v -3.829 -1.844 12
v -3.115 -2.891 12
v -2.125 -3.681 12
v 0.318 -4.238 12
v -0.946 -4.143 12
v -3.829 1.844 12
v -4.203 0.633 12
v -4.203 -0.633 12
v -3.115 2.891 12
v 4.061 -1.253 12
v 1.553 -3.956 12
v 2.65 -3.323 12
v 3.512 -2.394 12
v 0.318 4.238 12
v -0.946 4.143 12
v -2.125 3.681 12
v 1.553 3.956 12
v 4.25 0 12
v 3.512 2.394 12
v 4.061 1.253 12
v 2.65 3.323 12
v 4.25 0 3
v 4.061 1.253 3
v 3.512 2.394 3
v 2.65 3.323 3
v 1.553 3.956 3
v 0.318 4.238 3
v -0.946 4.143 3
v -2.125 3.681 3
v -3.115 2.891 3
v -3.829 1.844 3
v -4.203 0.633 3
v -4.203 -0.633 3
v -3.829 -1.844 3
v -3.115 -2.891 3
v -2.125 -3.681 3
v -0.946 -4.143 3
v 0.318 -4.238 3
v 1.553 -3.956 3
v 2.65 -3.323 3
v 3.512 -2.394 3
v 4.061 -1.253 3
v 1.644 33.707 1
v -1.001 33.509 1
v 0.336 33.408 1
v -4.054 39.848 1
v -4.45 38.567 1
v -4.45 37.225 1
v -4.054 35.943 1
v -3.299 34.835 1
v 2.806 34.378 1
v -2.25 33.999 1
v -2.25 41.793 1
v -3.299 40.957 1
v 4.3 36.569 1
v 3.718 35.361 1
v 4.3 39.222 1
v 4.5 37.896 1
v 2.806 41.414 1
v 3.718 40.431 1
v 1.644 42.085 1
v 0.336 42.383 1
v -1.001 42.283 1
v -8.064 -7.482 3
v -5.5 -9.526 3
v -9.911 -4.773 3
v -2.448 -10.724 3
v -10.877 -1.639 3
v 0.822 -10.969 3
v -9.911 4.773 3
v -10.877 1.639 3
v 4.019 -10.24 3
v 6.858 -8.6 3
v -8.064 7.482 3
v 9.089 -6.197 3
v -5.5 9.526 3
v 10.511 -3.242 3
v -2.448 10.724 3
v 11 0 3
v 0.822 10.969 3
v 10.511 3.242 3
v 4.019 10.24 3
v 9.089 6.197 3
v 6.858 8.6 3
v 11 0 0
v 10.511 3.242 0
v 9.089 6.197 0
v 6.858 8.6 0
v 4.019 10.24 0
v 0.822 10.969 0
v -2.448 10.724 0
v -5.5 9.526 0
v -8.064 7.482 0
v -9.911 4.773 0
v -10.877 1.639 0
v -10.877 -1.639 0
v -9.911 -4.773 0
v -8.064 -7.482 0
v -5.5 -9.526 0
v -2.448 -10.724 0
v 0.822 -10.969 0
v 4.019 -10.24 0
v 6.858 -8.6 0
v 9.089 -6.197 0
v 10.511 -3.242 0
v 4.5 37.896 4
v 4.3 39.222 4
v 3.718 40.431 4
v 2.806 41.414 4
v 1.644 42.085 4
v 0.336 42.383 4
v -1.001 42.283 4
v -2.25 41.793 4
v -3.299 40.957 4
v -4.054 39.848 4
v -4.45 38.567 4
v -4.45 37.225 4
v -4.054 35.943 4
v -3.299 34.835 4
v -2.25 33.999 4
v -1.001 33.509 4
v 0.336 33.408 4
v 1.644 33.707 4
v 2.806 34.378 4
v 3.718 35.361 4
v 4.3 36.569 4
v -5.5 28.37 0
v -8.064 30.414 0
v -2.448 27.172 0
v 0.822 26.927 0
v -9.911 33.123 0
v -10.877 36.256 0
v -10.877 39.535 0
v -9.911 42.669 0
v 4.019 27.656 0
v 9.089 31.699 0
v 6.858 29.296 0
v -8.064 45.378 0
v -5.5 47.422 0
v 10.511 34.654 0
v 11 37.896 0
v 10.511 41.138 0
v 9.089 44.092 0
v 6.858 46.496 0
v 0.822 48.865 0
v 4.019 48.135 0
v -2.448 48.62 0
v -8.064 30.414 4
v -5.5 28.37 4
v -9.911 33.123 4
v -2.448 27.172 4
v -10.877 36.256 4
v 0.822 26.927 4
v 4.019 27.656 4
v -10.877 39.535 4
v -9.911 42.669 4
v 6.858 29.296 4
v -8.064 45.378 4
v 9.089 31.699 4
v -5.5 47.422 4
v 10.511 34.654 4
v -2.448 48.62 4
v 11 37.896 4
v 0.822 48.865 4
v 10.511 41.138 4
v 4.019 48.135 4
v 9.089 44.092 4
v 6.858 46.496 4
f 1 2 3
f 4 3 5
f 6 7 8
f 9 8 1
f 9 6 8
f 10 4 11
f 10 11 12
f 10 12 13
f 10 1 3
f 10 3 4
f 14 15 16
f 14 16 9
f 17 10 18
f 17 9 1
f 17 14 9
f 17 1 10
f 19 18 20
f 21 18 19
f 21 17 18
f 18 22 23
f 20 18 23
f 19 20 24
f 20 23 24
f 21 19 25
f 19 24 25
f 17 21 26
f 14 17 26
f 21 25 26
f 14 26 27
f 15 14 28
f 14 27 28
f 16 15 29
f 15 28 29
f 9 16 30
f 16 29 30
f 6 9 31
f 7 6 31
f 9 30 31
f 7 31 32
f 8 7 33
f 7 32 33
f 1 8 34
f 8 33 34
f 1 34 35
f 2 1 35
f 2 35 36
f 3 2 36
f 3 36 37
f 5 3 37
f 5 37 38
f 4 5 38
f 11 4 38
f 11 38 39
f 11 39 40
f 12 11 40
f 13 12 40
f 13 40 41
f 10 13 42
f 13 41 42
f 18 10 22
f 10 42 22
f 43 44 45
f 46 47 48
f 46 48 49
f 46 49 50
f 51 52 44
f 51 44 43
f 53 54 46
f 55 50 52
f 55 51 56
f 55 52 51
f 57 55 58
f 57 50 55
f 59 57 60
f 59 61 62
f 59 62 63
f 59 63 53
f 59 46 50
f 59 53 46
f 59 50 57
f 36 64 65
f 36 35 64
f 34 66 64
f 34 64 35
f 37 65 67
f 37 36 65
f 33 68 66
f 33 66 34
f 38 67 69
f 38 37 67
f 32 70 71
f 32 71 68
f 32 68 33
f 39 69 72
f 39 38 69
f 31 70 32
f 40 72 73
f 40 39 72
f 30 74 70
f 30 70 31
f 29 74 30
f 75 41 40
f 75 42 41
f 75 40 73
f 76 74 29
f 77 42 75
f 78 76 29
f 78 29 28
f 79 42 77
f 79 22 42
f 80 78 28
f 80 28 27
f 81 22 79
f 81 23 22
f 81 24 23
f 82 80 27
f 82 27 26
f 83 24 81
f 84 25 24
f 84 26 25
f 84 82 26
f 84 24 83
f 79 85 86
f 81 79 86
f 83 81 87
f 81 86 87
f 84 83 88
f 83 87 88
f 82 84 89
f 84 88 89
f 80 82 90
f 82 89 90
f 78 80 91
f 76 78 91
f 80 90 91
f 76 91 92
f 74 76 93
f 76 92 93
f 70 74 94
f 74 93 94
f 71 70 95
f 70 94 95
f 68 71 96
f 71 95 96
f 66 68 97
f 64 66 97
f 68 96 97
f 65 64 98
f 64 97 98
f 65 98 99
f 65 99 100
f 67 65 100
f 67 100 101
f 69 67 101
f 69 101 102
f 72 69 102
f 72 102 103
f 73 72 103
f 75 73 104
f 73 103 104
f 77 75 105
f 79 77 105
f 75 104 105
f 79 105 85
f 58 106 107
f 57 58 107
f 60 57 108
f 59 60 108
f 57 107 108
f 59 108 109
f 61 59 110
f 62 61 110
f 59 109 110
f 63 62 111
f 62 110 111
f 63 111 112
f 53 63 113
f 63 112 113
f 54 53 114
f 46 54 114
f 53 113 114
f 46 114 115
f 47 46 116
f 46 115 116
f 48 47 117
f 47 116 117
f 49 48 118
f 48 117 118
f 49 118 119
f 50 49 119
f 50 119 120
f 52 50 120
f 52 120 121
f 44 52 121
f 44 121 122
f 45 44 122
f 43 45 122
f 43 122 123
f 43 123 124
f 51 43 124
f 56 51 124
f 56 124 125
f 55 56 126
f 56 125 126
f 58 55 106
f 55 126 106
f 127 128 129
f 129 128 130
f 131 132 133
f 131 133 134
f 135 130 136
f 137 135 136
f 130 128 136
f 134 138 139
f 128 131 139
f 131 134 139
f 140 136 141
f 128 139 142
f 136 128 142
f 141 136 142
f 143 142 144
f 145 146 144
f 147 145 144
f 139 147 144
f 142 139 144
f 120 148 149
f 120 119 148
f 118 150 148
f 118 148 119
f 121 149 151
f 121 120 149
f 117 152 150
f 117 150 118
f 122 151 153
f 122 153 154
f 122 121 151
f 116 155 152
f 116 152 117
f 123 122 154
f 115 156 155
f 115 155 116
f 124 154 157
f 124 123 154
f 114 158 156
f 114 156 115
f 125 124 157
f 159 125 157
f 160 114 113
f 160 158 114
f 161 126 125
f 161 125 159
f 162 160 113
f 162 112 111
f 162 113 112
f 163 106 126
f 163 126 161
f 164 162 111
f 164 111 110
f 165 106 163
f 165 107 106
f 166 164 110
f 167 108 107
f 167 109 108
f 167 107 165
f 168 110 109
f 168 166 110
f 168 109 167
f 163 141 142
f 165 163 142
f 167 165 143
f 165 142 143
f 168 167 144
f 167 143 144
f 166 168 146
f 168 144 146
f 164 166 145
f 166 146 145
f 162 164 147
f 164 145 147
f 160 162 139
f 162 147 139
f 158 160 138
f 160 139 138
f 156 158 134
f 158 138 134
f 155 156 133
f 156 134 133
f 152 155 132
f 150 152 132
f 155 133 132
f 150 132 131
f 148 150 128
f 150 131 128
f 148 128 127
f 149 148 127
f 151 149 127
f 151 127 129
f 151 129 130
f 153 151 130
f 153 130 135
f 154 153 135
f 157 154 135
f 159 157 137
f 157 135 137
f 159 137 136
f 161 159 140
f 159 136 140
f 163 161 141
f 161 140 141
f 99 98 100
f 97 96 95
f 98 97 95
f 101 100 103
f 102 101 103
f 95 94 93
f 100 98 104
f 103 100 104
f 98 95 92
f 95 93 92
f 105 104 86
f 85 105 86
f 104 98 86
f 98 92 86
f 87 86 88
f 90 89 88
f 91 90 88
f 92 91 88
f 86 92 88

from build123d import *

# Parameters (mm, degrees)
F0_R     = 11
F1_DEPTH = 3
F2_R     = 4.25
F3_DEPTH = 9
F4_R     = 11
F5_DEPTH = 4
F6_R     = 4.5
F7_DEPTH = 3


with BuildPart() as f1:
    # F0 (on Top) → F1 (new body)
    with BuildSketch(Plane.XY):
        Circle(F0_R)
    extrude(amount=F1_DEPTH)

    # F2 (on face) → F3 (join)
    with BuildSketch(Plane.XY.offset(3)):
        Circle(F2_R)
    extrude(amount=F3_DEPTH)


with BuildPart() as f5:
    # F4 (on Top) → F5 (new body)
    with BuildSketch(Plane.XY):
        with Locations((0, 37.895887)):
            Circle(F4_R)
    extrude(amount=F5_DEPTH)

    # F6 (on face) → F7 (cut)
    with BuildSketch(Plane.XY.offset(4)):
        with Locations((0, 37.895887)):
            Circle(F6_R)
    extrude(amount=-F7_DEPTH, mode=Mode.SUBTRACT)


solid = Compound([f1.part, f5.part])
